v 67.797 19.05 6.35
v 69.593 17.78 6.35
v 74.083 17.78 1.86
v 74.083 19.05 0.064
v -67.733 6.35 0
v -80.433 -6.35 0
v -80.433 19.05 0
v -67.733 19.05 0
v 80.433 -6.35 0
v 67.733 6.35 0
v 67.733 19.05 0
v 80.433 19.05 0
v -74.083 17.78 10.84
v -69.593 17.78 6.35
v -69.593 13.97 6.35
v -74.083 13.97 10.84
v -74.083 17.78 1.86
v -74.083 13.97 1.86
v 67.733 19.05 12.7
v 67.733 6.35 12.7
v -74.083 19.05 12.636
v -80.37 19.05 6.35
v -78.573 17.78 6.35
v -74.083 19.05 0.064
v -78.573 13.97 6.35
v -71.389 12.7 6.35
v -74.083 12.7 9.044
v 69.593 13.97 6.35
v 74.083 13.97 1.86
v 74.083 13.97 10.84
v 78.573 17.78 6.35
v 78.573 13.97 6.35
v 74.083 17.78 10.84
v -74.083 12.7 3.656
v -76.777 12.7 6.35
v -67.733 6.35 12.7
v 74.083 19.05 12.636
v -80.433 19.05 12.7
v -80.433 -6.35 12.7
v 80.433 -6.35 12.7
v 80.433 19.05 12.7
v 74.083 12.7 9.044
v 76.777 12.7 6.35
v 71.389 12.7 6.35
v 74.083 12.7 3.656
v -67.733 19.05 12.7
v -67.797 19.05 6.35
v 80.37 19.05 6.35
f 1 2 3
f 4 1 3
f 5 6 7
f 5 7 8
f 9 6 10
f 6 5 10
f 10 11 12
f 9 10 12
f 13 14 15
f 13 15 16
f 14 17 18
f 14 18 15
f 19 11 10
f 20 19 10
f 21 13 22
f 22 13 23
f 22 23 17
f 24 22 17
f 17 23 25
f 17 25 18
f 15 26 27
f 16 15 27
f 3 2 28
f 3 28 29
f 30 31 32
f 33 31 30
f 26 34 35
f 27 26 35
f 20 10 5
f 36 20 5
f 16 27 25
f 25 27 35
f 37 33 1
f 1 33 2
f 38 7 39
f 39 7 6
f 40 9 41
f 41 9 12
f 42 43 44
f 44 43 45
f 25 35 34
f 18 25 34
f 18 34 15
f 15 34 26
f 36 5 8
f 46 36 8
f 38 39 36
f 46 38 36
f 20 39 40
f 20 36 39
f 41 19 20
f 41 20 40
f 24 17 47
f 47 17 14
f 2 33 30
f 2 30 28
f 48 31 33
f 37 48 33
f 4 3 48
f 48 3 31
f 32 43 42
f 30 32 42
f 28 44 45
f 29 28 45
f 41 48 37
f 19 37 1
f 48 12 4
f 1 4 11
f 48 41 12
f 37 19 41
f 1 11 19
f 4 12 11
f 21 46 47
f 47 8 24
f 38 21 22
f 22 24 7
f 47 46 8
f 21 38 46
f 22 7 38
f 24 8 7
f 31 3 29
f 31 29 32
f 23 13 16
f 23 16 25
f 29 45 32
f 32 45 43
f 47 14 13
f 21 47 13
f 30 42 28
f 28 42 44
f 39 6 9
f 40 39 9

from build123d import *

# Parameters (mm, degrees)
BOSS_EXTRUDE1_DEPTH = 12.7
CUT_EXTRUDE1_DEPTH  = 6.35
CHAMFER1_SIZE       = 1.27


with BuildPart() as part:
    # Sketch1 → Boss-Extrude1 (new body)
    with BuildSketch(Plane.XY):
        Polygon((-80.433333333, 19.05), (-80.433333333, -6.35), (80.433333333, -6.35), (80.433333333, 19.05), (67.733333333, 19.05), (67.733333333, 6.35), (-67.733333333, 6.35), (-67.733333333, 19.05), align=None)
    extrude(amount=BOSS_EXTRUDE1_DEPTH)

    # Sketch2 → Cut-Extrude1 (cut)
    with BuildSketch(Plane(origin=(0, 19.05, 0), x_dir=(1, 0, 0), z_dir=(0, 1, 0))):
        Polygon((-78.573461394, -6.35), (-74.083333333, -1.859871939), (-69.593205273, -6.35), (-74.083333333, -10.840128061), align=None)
        Polygon((69.593205273, -6.35), (74.083333333, -1.859871939), (78.573461394, -6.35), (74.083333333, -10.840128061), align=None)
    extrude(amount=-CUT_EXTRUDE1_DEPTH, mode=Mode.SUBTRACT)

    # Chamfer1
    chamfer1_edges = [part.edges().sort_by_distance(p)[0] for p in [
        (-76.328397364, 12.7, 8.59506403),
        (-76.328397364, 12.7, 4.10493597),
        (-71.838269303, 12.7, 4.10493597),
        (-71.838269303, 12.7, 8.59506403),
        (-76.328397364, 19.05, 8.59506403),
        (-71.838269303, 19.05, 8.59506403),
        (-71.838269303, 19.05, 4.10493597),
        (-76.328397364, 19.05, 4.10493597),
        (71.838269303, 12.7, 8.59506403),
        (71.838269303, 12.7, 4.10493597),
        (76.328397364, 12.7, 4.10493597),
        (76.328397364, 12.7, 8.59506403),
        (71.838269303, 19.05, 8.59506403),
        (76.328397364, 19.05, 8.59506403),
        (76.328397364, 19.05, 4.10493597),
        (71.838269303, 19.05, 4.10493597),
    ]]
    chamfer(chamfer1_edges, length=CHAMFER1_SIZE)


solid = part.part
